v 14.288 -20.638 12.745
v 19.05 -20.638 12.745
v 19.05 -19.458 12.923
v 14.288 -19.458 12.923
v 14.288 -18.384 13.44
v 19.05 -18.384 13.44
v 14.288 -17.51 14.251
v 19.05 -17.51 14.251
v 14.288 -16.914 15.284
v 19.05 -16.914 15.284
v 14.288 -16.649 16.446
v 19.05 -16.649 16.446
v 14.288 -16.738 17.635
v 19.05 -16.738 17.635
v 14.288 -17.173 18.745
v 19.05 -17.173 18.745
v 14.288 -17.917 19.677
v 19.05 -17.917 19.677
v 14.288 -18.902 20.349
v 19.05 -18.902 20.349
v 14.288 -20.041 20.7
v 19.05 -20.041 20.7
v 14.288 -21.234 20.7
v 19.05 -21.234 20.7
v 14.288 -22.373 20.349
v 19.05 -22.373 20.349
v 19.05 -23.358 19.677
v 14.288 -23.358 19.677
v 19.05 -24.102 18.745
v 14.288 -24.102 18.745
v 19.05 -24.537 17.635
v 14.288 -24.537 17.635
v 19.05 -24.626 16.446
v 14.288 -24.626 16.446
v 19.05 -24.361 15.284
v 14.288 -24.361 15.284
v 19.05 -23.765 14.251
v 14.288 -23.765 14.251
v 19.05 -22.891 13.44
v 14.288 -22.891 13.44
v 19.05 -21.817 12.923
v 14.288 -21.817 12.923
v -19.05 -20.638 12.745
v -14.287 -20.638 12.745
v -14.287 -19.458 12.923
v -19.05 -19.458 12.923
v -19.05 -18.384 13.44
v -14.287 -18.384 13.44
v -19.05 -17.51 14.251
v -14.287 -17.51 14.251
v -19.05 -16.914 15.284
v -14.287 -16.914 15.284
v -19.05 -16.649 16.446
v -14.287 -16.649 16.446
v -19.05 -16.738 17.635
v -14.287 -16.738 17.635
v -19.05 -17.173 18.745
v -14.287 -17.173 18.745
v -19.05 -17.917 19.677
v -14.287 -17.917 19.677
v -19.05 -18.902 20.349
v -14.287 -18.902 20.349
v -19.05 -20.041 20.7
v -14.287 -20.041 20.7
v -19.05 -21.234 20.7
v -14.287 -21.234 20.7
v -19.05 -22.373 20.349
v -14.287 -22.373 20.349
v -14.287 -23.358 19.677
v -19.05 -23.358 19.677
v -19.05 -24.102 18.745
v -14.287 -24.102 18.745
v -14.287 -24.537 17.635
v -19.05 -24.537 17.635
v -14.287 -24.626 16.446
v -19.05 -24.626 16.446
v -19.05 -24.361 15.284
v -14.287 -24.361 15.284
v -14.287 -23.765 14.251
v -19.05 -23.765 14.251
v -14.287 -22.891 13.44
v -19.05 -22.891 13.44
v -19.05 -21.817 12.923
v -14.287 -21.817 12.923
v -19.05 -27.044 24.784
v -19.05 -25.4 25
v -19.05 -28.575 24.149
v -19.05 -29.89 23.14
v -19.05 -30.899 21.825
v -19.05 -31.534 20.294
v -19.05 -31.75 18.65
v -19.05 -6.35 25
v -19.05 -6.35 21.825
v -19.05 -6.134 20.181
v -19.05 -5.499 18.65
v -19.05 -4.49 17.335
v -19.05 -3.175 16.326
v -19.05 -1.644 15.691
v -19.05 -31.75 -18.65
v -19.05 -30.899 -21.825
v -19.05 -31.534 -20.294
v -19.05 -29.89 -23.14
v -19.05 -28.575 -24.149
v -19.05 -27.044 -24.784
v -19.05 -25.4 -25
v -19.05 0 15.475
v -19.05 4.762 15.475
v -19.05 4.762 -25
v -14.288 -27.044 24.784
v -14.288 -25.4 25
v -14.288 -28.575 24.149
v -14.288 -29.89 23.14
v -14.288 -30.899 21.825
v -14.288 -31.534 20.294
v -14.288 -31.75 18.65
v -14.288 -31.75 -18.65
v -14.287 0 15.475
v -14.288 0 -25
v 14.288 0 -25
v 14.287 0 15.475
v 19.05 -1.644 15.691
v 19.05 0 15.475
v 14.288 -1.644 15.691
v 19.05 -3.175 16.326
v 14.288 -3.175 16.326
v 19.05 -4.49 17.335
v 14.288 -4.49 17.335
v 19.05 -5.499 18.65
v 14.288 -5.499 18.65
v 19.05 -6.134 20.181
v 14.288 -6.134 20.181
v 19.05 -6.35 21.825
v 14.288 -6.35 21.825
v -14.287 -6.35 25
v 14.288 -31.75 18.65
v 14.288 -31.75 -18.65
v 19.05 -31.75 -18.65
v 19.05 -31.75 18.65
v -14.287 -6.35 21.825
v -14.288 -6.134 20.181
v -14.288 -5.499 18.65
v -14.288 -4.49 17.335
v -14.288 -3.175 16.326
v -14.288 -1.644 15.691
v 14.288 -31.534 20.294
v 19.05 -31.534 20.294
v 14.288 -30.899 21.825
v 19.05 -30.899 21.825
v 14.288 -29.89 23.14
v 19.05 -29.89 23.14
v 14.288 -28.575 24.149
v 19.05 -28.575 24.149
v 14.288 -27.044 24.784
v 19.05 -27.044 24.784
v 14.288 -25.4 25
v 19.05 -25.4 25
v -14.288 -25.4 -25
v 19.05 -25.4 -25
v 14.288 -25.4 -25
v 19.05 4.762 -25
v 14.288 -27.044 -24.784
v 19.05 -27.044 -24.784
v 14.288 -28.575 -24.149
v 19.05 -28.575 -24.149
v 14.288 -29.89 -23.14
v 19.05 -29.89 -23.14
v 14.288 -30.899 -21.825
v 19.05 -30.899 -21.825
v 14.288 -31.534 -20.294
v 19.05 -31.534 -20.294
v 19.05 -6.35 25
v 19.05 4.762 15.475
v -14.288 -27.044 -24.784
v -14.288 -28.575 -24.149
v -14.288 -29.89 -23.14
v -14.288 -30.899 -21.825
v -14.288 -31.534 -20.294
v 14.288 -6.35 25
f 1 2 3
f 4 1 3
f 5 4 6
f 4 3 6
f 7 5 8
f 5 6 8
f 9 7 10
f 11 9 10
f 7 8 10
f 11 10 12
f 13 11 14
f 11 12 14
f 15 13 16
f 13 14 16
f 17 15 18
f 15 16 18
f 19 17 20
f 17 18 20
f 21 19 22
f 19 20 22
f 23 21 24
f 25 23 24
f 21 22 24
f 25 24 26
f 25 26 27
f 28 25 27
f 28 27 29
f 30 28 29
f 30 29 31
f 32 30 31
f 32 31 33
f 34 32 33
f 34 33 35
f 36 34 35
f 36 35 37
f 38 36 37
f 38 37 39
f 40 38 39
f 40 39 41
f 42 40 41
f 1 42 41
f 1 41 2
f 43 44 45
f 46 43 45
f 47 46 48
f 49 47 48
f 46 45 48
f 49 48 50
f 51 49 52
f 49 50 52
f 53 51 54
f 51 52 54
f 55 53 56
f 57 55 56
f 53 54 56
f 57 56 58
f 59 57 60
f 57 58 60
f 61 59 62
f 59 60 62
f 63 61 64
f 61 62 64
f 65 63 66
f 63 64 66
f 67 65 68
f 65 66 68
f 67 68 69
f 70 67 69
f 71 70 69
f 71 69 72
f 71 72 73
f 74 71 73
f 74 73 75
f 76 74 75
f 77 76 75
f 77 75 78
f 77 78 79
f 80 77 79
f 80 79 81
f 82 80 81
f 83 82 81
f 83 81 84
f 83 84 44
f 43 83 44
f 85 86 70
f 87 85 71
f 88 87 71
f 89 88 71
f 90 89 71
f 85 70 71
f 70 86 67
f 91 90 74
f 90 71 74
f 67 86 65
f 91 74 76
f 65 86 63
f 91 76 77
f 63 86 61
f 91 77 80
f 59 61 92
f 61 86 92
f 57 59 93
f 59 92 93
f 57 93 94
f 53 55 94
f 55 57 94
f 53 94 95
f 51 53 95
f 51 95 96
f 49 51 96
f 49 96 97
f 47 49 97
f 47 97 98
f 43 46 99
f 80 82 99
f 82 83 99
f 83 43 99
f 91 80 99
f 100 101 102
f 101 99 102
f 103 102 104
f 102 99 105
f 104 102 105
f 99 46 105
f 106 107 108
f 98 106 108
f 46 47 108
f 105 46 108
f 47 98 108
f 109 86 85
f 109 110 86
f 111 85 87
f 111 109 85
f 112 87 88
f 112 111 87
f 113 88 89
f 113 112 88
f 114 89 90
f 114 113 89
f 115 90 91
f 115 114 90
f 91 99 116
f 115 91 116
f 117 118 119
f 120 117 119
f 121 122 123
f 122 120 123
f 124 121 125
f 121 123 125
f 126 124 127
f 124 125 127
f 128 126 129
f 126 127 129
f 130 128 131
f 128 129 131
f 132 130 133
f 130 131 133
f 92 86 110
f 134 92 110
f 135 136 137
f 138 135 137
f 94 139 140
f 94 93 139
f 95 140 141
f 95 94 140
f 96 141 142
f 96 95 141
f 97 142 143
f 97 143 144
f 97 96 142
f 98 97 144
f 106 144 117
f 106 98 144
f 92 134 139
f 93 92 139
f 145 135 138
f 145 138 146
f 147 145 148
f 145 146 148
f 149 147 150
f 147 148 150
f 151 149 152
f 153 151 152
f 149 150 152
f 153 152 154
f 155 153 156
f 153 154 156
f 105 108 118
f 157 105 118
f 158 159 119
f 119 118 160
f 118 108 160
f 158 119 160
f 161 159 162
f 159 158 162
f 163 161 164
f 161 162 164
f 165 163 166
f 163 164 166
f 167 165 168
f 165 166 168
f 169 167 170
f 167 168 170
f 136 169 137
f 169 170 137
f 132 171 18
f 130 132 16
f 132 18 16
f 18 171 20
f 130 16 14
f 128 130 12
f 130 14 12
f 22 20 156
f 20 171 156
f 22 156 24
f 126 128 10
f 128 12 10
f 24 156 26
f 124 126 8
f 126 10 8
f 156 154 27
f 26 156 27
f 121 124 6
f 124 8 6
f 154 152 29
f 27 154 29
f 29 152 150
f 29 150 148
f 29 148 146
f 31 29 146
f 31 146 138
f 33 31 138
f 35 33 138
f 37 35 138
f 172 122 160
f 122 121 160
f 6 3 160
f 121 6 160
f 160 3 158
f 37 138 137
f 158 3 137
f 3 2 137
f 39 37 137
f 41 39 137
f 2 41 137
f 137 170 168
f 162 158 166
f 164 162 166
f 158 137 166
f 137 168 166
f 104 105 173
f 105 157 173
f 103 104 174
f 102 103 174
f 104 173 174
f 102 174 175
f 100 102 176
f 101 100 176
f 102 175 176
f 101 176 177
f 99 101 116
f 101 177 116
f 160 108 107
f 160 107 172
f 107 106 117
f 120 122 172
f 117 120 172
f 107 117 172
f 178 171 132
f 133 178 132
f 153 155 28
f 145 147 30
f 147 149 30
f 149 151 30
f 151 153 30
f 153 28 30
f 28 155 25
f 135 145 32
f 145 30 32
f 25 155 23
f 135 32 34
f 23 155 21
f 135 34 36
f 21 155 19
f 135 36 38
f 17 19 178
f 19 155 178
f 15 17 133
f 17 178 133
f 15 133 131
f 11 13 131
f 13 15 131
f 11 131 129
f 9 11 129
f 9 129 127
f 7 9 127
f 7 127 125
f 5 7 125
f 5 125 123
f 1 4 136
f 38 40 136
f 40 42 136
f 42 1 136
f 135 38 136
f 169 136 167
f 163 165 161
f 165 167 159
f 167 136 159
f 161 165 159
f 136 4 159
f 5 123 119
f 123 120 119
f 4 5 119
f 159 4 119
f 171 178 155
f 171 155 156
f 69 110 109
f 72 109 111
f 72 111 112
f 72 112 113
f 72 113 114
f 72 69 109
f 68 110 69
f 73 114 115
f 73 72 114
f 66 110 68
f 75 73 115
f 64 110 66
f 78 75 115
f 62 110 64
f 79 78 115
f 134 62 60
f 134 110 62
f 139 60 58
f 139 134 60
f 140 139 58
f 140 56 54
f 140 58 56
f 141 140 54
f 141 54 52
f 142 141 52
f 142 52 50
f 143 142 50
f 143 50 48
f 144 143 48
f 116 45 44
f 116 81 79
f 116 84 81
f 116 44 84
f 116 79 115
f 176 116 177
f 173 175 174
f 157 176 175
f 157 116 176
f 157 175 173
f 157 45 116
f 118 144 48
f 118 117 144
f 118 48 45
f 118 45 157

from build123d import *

# Parameters (mm, degrees)
SKETCH1_W           = 4.7625
SKETCH1_H           = 50
SKETCH1_W_2         = 28.575
BOSS_EXTRUDE1_DEPTH = 4.7625
SKETCH1_3_W         = 4.7625
SKETCH1_3_H         = 50
BOSS_EXTRUDE2_DEPTH = 31.75
SKETCH3_W           = 9.525
SKETCH3_H           = 11.1125
SKETCH3_R           = 4
CUT_EXTRUDE1_DEPTH  = 39.1
FILLET1_R           = 6.35


with BuildPart() as part:
    # Sketch1 → Boss-Extrude1 (new body)
    with BuildSketch(Plane(origin=(0, 0, 0), x_dir=(1, 0, 0), z_dir=(0, 1, 0))):
        with Locations((-16.66875, 0)):
            Rectangle(SKETCH1_W, SKETCH1_H)
        Rectangle(SKETCH1_W_2, SKETCH1_H)
        with Locations((16.66875, 0)):
            Rectangle(SKETCH1_W, SKETCH1_H)
    extrude(amount=BOSS_EXTRUDE1_DEPTH)

    # Sketch1<3> → Boss-Extrude2 (add)
    with BuildSketch(Plane(origin=(0, 0, 0), x_dir=(1, 0, 0), z_dir=(0, 1, 0))):
        with Locations((-16.66875, 0)):
            Rectangle(SKETCH1_3_W, SKETCH1_3_H)
        with Locations((16.66875, 0)):
            Rectangle(SKETCH1_3_W, SKETCH1_3_H)
    extrude(amount=-BOSS_EXTRUDE2_DEPTH)

    # Sketch3 → Cut-Extrude1 (cut, through all)
    with BuildSketch(Plane(origin=(19.05, 0, 0), x_dir=(0, 0, -1), z_dir=(1, 0, 0))):
        with Locations((-20.2375, -0.79375)):
            Rectangle(SKETCH3_W, SKETCH3_H)
        with Locations((-16.745, -20.6375)):
            Circle(SKETCH3_R)
    extrude(amount=-CUT_EXTRUDE1_DEPTH, mode=Mode.SUBTRACT)

    # Fillet1
    fillet1_edges = [part.edges().sort_by_distance(p)[0] for p in [
        (-16.66875, -31.75, 25),
        (16.66875, -31.75, 25),
        (-16.66875, -31.75, -25),
        (16.66875, -31.75, -25),
        (-16.66875, -6.35, 15.475),
        (16.66875, -6.35, 15.475),
    ]]
    fillet(fillet1_edges, radius=FILLET1_R)


solid = part.part
